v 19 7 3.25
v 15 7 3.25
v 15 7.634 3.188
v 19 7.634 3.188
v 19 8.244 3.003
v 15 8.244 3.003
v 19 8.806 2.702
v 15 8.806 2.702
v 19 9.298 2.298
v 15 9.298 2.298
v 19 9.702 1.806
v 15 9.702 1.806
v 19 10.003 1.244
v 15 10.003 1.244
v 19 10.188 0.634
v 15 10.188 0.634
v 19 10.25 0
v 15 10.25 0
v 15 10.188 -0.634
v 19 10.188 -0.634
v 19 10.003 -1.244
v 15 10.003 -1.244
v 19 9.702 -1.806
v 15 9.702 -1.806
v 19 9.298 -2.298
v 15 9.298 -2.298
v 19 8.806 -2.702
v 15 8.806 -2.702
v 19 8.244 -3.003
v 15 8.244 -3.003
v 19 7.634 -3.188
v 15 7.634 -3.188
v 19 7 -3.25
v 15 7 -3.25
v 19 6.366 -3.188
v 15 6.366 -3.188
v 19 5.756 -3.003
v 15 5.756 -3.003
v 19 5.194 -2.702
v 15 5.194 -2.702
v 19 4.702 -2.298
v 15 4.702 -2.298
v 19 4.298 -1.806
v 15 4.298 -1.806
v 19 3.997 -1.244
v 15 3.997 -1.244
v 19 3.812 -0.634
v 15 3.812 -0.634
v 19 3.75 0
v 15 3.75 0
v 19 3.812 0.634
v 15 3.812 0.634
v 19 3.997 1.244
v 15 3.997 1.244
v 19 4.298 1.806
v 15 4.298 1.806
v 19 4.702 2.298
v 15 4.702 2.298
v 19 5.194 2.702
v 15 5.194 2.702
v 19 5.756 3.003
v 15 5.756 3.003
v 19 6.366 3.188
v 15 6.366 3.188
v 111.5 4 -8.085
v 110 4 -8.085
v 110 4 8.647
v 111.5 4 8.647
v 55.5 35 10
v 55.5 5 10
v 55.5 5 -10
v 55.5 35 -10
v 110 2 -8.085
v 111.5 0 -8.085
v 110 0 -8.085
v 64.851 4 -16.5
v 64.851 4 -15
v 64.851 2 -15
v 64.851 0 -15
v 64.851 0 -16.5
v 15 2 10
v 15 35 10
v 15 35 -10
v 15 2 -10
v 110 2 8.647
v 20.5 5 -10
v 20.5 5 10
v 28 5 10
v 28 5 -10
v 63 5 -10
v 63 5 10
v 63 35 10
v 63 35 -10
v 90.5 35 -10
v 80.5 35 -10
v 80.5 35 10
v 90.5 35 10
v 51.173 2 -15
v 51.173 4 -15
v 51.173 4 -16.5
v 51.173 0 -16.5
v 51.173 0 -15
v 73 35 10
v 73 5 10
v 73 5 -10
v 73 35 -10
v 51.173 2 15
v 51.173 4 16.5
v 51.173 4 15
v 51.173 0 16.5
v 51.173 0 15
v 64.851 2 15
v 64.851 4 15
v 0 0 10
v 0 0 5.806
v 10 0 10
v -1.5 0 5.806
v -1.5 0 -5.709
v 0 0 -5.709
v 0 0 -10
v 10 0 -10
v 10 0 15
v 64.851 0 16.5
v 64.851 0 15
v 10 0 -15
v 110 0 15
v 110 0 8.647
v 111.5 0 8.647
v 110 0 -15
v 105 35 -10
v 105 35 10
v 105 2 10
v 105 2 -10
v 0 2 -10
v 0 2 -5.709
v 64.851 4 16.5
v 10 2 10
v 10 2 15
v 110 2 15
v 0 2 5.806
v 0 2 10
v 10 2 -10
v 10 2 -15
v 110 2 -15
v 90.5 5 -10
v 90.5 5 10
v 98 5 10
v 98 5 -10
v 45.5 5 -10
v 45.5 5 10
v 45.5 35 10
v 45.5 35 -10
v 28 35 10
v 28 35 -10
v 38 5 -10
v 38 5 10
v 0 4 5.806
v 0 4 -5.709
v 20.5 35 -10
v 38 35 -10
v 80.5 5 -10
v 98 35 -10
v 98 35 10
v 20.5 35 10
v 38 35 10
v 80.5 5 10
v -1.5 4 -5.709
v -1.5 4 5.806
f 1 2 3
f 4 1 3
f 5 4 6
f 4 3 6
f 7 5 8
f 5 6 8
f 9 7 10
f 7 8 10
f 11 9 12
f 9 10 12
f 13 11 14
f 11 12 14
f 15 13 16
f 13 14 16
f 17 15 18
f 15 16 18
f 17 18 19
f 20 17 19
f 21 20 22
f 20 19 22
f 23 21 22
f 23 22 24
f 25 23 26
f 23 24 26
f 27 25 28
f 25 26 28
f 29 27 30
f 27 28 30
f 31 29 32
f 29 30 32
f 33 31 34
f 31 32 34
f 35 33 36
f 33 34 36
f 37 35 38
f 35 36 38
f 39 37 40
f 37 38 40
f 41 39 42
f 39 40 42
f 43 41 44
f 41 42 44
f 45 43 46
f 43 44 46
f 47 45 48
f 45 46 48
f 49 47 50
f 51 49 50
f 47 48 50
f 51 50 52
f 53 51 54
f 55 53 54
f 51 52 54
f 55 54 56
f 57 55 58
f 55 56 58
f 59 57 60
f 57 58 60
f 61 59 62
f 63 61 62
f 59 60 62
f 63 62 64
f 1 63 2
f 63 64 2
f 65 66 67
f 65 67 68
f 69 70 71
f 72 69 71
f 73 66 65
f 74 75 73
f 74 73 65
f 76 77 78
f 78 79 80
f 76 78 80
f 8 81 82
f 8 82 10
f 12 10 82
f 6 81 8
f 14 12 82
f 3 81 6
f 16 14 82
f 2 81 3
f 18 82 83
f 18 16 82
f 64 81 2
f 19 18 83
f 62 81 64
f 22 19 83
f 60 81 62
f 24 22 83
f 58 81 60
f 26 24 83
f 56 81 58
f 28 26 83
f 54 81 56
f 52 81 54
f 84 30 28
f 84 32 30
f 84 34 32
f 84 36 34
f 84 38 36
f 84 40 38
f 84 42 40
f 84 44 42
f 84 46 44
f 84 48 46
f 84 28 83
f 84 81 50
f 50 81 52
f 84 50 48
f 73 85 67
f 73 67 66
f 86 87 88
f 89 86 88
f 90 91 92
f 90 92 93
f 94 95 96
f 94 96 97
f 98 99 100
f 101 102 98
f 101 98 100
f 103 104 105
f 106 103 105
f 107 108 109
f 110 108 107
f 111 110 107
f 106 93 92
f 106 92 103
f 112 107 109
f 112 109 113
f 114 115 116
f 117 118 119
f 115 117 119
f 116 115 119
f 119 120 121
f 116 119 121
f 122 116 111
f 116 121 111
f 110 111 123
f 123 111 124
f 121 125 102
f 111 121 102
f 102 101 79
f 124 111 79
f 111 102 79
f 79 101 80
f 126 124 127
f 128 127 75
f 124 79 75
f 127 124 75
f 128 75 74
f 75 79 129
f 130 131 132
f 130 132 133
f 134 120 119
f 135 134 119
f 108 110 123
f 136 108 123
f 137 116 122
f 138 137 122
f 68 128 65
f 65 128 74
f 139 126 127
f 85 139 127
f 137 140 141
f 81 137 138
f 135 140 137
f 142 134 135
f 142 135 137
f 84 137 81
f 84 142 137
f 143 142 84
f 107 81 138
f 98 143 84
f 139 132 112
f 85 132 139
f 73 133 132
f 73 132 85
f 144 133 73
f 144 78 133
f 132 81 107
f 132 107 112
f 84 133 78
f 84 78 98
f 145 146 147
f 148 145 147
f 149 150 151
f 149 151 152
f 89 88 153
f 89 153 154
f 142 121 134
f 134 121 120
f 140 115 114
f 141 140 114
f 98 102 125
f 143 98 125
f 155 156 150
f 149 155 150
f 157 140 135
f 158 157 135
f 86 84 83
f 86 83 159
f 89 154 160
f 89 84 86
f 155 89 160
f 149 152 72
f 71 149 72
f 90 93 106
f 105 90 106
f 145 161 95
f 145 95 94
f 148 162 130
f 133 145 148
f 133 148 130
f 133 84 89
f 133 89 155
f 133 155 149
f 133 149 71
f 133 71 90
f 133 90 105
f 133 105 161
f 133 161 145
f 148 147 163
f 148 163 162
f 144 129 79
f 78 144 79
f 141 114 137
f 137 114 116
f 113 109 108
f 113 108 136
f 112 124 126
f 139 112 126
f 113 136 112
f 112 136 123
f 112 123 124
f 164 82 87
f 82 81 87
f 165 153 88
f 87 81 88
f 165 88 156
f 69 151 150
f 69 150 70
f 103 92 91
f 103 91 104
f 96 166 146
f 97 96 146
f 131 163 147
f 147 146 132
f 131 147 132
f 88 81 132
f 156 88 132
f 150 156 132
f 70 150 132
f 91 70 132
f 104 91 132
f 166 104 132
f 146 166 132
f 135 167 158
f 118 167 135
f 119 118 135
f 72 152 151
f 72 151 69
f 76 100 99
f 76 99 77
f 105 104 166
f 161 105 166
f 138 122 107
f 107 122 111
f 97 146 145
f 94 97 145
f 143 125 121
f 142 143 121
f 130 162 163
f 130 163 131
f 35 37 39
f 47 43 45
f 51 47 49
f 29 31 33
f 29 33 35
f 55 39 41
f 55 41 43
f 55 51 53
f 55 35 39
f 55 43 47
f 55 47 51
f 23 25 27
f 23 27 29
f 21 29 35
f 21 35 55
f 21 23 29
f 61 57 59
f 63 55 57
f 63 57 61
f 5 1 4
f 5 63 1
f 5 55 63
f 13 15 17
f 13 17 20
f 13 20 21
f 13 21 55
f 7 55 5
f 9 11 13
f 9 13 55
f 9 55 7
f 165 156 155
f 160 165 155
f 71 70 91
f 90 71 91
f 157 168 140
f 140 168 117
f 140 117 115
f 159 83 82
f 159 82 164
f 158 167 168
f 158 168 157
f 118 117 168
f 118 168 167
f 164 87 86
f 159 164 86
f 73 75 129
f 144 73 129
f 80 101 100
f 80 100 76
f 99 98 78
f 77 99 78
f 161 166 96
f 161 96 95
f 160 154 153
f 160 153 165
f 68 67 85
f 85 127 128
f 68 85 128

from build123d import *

# Parameters (mm, degrees)
EXTRUDE_1_DEPTH     = 2
SKETCH_2_W          = 90
SKETCH_2_H          = 20
EXTRUDE_2_DEPTH     = 3
SKETCH_3_W          = 10
SKETCH_3_H          = 20
SKETCH_3_W_2        = 5.5
SKETCH_3_W_3        = 7
EXTRUDE_3_DEPTH     = 30
SKETCH_4_R          = 3.25
CUT_EXTRUDE_1_DEPTH = 4
SKETCH_5_W          = 13.678161833
SKETCH_5_H          = 1.5
SKETCH_5_W_2        = 1.5
SKETCH_5_H_2        = 16.732170562
SKETCH_5_H_3        = 11.514895911
EXTRUDE_4_DEPTH     = 4


with BuildPart() as part:
    # 草图1 → 凸台-拉伸1 (new body)
    with BuildSketch(Plane(origin=(0, 0, 0), x_dir=(1, 0, 0), z_dir=(0, 1, 0))):
        Polygon((10, 15), (10, 10), (0, 10), (0, -10), (10, -10), (10, -15), (110, -15), (110, 15), align=None)
    extrude(amount=EXTRUDE_1_DEPTH)

    # 草图2 → 凸台-拉伸2 (add)
    with BuildSketch(Plane(origin=(0, 2, 0), x_dir=(1, 0, 0), z_dir=(0, 1, 0))):
        with Locations((60, 0)):
            Rectangle(SKETCH_2_W, SKETCH_2_H)
    extrude(amount=EXTRUDE_2_DEPTH)

    # 草图3 → 凸台-拉伸3 (add)
    with BuildSketch(Plane(origin=(0, 5, 0), x_dir=(1, 0, 0), z_dir=(0, 1, 0))):
        with Locations((85.5, 0)):
            Rectangle(SKETCH_3_W, SKETCH_3_H)
        with Locations((68, 0)):
            Rectangle(SKETCH_3_W, SKETCH_3_H)
        with Locations((50.5, 0)):
            Rectangle(SKETCH_3_W, SKETCH_3_H)
        with Locations((33, 0)):
            Rectangle(SKETCH_3_W, SKETCH_3_H)
        with Locations((17.75, 0)):
            Rectangle(SKETCH_3_W_2, SKETCH_3_H)
        with Locations((101.5, 0)):
            Rectangle(SKETCH_3_W_3, SKETCH_3_H)
    extrude(amount=EXTRUDE_3_DEPTH)

    # 草图4 → 切除-拉伸1 (cut)
    with BuildSketch(Plane.ZY.offset(-15)):
        with Locations((0, 7)):
            Circle(SKETCH_4_R)
    extrude(amount=-CUT_EXTRUDE_1_DEPTH, mode=Mode.SUBTRACT)

    # 草图5 → 凸台-拉伸4 (add)
    with BuildSketch(Plane(origin=(0, 0, 0), x_dir=(1, 0, 0), z_dir=(0, 1, 0))):
        with Locations((58.012206535, -15.75)):
            Rectangle(SKETCH_5_W, SKETCH_5_H)
        with Locations((58.012206535, 15.75)):
            Rectangle(SKETCH_5_W, SKETCH_5_H)
        with Locations((110.75, -0.281087738)):
            Rectangle(SKETCH_5_W_2, SKETCH_5_H_2)
        with Locations((-0.75, -0.048934151)):
            Rectangle(SKETCH_5_W_2, SKETCH_5_H_3)
    extrude(amount=EXTRUDE_4_DEPTH)


solid = part.part
